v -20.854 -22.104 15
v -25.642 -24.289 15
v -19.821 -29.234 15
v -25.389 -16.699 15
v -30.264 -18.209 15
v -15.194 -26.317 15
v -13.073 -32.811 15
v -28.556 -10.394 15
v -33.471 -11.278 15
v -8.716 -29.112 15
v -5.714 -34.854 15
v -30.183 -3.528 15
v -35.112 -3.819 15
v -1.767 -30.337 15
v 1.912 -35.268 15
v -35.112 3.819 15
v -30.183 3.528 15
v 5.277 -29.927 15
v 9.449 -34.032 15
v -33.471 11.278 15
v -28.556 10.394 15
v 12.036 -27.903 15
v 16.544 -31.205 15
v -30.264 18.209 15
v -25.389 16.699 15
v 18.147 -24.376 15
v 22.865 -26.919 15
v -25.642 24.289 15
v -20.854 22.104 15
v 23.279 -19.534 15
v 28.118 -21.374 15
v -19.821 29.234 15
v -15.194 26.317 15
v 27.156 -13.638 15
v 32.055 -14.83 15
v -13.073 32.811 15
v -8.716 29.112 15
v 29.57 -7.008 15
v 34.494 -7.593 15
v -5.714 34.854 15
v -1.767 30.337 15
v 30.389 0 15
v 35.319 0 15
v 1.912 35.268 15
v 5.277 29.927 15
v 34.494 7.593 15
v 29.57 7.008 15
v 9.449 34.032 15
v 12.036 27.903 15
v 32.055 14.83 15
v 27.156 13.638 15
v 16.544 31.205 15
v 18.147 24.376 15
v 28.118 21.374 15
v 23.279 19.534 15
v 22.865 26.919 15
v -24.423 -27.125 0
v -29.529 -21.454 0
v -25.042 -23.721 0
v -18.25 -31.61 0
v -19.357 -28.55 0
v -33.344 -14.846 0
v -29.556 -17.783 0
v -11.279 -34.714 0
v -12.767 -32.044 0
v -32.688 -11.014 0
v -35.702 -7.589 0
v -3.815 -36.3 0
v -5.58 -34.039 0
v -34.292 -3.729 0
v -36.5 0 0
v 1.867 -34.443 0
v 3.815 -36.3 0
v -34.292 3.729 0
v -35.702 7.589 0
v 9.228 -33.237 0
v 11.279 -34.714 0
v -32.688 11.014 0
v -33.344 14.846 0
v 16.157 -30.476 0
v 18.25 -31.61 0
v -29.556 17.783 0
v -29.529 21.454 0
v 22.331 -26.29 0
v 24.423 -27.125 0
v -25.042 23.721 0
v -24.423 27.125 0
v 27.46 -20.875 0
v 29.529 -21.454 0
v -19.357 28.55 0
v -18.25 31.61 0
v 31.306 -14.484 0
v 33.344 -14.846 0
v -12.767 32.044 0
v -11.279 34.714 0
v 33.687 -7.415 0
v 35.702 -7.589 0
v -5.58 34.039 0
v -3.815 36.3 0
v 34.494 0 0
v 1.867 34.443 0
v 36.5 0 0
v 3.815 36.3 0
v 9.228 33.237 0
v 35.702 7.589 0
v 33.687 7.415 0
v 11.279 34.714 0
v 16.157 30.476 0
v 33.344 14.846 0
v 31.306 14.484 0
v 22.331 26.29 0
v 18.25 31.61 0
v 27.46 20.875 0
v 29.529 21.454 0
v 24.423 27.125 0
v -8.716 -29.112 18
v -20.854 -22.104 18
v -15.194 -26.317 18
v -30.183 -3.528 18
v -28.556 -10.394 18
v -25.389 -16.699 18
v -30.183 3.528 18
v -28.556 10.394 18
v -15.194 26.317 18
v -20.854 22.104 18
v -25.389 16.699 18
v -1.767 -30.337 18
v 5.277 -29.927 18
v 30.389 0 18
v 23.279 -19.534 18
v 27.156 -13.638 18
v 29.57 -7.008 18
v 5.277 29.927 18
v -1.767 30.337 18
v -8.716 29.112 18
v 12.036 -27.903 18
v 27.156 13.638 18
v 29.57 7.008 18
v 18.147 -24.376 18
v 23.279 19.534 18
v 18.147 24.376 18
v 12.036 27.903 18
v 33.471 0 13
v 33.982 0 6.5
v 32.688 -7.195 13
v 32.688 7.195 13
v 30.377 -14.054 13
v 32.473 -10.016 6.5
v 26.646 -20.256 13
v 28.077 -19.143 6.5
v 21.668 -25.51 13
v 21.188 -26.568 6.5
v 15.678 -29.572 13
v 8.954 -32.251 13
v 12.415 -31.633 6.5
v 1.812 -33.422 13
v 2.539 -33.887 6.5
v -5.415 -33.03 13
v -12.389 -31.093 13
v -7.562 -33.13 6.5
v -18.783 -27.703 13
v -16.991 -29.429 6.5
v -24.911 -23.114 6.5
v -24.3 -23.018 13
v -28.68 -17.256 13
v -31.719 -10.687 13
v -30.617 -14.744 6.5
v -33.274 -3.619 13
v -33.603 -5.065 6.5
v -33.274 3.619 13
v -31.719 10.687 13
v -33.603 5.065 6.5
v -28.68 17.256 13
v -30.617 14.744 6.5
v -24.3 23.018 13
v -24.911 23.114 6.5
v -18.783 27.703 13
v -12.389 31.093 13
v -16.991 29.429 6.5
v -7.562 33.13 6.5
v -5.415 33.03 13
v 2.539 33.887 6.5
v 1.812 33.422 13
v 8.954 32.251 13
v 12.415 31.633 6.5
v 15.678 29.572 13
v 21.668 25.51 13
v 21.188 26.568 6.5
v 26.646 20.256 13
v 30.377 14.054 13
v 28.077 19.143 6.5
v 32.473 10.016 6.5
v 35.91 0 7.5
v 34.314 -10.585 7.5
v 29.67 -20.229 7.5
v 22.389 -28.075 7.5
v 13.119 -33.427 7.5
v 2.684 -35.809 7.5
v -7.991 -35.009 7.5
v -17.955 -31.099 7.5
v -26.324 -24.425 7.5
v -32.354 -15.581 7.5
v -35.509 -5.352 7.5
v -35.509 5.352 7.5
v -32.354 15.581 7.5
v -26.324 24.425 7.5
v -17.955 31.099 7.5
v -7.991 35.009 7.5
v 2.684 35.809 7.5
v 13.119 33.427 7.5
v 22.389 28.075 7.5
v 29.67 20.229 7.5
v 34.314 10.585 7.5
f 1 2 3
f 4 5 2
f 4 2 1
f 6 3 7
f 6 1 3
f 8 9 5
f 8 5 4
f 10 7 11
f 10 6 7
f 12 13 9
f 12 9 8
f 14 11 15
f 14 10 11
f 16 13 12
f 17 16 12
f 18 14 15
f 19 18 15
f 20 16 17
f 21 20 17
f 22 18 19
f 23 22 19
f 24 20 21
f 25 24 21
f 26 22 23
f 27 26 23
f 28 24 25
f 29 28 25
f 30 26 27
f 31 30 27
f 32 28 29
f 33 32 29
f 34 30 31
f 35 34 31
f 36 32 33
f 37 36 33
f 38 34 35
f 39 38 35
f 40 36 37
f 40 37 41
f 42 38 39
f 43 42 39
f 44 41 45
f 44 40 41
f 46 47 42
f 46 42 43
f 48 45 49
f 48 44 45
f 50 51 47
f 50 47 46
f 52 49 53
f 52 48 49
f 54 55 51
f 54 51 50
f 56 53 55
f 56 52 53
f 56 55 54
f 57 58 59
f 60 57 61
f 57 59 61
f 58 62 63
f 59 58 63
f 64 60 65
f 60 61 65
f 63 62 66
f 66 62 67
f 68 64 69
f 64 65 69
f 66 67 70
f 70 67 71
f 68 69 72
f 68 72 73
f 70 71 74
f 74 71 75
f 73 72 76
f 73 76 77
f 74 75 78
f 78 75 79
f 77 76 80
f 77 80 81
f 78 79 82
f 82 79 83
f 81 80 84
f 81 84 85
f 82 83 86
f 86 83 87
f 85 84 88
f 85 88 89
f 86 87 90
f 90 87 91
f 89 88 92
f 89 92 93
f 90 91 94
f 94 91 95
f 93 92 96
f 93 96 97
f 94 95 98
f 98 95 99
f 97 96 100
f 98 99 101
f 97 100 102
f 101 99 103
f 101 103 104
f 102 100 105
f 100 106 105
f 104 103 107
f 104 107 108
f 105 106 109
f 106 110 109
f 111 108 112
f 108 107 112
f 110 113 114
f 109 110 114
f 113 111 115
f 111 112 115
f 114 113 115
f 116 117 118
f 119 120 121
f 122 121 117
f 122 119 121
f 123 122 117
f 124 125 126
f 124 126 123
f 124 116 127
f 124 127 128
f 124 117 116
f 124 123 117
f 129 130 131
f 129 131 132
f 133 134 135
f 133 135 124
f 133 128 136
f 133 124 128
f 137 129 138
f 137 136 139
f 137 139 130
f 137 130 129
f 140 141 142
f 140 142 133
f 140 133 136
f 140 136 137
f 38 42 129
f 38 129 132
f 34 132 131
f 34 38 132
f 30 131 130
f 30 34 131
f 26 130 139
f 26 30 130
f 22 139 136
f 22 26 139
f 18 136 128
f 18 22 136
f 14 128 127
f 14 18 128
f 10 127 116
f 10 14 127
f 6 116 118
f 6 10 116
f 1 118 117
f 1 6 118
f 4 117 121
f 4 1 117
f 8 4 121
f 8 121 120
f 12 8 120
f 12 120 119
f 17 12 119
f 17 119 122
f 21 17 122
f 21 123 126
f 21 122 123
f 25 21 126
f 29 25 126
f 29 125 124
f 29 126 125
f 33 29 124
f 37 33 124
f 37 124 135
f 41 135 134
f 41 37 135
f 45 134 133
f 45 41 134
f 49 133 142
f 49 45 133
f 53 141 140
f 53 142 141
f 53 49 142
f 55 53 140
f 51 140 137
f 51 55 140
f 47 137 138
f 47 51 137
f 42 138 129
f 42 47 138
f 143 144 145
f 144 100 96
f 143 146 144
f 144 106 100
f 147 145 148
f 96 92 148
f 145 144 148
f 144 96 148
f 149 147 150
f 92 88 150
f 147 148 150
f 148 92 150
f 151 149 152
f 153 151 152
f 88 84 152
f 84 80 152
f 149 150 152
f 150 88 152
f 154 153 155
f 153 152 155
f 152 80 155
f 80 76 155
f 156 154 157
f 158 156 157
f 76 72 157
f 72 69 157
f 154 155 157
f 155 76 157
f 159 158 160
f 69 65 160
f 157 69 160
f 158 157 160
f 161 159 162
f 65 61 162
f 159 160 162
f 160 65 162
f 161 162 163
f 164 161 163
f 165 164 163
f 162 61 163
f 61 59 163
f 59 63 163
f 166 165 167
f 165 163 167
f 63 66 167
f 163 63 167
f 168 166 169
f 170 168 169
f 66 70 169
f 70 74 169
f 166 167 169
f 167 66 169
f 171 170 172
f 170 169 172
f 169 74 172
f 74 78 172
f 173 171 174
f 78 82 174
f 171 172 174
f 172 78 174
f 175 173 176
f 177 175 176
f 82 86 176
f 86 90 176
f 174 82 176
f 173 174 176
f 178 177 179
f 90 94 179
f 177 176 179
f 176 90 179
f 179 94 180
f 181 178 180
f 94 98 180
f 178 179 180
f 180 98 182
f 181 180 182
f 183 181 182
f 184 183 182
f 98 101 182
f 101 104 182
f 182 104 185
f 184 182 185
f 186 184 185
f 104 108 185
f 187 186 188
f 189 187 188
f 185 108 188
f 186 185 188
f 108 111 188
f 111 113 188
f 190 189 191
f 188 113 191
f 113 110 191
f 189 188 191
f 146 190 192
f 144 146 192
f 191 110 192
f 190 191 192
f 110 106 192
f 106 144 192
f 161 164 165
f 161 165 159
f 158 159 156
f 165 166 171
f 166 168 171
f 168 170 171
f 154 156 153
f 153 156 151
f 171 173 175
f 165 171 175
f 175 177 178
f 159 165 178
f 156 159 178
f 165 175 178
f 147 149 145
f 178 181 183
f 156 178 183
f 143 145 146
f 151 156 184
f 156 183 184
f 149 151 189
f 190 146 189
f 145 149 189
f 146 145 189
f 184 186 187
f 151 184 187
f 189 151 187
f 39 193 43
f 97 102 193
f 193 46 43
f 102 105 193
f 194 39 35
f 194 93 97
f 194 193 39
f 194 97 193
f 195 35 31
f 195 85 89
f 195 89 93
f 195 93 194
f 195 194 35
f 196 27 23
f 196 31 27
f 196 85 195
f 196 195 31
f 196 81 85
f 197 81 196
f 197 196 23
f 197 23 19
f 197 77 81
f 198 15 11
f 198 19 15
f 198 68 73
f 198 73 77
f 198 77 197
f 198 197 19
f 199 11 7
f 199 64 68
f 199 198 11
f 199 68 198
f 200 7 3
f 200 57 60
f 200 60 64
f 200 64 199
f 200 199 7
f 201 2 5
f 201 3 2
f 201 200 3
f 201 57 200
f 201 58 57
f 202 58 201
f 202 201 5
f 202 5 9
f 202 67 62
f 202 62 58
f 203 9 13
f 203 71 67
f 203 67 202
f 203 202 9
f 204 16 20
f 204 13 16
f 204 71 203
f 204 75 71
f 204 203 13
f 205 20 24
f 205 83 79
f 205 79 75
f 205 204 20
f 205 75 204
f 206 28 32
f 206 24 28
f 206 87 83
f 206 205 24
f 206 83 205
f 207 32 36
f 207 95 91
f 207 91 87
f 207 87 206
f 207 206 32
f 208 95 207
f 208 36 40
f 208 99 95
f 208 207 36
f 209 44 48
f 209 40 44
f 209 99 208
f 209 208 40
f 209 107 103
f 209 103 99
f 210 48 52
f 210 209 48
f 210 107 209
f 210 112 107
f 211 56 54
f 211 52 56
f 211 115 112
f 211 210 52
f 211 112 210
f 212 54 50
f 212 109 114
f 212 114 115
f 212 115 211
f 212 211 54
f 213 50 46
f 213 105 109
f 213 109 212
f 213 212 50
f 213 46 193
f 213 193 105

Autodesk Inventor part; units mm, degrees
ref_plane "YZ Plane" through (0, 0, 0) normal (1, 0, 0) x (0, 1, 0)
ref_plane "XZ Plane" through (0, 0, 0) normal (0, 1, 0) x (-1, 0, 0)
ref_plane "XY Plane" through (0, 0, 0) normal (0, 0, 1) x (1, 0, 0)
sketch "Эскиз2" plane through (0, 0, 0) normal (0, 0, 1) x (1, 0, 0)
  circle A0 centre (0, 0) radius 36.5
  circle A1 centre (0, 0) radius 32.0179
  dimension "d2" = 73
extrude "Выдавливание1" add sketch "Эскиз2" along normal blind 15 contours A0 | A1
draft "НаклГрань1" angle 4.5 pull direction (0, 0, 1) faces at (36.3902, -2.8285, 10) fixed edges at (-36.5, 0, 0)
shell "Оболочка1" thickness 2 removed faces 1 at (4.5012, 0.5261, 0)
sketch "Эскиз3" plane through (0, 0, 15) normal (0, 0, 1) x (1, 0, 0)
  circle A0 centre (0, 0) radius 30.3888
extrude "Выдавливание2" add sketch "Эскиз3" along normal blind 3
properties part number "CUP"
